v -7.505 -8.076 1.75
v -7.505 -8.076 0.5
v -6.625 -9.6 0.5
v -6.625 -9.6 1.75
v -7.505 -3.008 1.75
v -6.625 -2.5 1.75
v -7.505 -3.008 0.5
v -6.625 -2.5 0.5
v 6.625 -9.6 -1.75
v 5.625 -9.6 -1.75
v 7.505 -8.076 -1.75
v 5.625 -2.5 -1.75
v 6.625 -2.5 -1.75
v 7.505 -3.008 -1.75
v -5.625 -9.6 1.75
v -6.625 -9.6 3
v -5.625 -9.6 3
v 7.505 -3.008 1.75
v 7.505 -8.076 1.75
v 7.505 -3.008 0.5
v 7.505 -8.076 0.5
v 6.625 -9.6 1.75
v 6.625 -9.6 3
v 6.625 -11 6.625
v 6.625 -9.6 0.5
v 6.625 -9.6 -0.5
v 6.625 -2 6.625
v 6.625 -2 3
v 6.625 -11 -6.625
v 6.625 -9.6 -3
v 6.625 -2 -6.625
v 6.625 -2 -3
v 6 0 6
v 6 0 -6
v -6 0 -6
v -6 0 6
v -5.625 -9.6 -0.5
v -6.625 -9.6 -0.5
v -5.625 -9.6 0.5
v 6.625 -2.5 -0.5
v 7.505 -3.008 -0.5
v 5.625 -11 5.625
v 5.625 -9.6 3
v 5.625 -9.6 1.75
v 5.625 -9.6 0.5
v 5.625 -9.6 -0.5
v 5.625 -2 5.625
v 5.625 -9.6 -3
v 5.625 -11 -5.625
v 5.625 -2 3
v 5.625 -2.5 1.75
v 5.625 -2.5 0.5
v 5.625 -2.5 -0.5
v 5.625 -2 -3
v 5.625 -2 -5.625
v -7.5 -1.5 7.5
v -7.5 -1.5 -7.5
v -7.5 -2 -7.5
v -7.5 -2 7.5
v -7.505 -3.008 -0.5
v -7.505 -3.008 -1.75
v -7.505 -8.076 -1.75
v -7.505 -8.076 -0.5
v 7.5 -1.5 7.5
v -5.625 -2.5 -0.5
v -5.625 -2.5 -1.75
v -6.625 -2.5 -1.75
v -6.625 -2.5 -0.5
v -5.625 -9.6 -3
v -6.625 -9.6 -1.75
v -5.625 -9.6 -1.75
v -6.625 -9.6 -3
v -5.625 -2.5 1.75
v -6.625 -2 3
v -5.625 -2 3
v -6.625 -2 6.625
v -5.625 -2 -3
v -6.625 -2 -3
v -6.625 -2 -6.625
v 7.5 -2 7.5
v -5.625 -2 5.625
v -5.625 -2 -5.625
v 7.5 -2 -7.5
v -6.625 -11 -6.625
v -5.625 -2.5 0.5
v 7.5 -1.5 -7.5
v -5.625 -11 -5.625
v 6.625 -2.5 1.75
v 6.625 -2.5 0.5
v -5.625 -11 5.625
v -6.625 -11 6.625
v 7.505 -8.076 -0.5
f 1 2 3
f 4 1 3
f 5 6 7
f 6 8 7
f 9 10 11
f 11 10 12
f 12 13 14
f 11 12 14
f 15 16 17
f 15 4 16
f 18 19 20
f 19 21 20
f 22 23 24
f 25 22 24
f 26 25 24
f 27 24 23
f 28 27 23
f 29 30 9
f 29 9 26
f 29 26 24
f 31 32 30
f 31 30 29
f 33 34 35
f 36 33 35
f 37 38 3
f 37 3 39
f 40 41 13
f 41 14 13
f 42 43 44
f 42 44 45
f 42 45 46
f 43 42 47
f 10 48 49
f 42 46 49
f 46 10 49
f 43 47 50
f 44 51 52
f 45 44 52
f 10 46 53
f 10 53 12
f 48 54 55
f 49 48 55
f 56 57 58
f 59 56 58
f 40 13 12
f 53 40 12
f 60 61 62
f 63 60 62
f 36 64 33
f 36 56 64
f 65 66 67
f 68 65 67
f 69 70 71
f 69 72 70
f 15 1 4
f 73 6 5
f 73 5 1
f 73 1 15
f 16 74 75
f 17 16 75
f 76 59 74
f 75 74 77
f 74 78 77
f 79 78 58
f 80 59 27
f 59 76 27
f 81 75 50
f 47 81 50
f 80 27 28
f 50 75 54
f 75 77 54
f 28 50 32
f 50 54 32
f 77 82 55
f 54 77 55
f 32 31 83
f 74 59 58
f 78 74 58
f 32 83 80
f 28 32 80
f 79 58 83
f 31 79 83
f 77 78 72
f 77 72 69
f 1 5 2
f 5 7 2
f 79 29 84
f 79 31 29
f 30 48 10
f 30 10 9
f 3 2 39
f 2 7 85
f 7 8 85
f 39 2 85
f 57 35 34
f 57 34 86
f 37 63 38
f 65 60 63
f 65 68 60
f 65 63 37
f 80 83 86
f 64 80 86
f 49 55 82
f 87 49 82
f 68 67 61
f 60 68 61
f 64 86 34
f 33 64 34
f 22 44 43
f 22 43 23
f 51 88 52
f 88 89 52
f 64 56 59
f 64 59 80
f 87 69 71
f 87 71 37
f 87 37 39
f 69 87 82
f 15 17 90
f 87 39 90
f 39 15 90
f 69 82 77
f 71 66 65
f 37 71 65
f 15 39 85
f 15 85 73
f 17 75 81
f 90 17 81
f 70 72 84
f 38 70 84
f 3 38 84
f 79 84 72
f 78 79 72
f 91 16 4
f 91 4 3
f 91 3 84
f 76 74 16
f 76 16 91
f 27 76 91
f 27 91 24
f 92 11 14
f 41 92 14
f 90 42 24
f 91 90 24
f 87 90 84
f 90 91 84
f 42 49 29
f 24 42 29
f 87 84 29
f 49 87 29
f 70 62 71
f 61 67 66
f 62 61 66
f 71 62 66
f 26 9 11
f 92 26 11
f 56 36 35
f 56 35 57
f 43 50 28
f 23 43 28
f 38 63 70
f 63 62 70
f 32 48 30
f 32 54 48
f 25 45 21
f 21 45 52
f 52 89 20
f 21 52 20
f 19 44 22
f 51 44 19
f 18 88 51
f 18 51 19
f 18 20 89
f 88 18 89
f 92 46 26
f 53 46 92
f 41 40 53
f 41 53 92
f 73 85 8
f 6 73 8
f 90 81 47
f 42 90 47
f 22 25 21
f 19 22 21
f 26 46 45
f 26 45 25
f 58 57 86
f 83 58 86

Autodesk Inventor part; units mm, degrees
sketch "Sketch_1" plane through (0, 0, 0) normal (0, 0, 1) x (1, 0, 0)
  line L0 (-7.5, -1.5) -> (-7.5, -2)
  line L1 (-7.5, -2) -> (7.5, -2)
  line L2 (7.5, -2) -> (7.5, -1.5)
  line L3 (7.5, -1.5) -> (6, 0)
  line L4 (6, 0) -> (-6, 0)
  line L5 (-6, 0) -> (-7.5, -1.5)
extrude "Extrusion1" add sketch "Sketch_1" along normal mid plane 15
sketch "Sketch_2" plane through (0, 0, 0) normal (1, 0, 0) x (0, 0, -1)
  line L0 (-7.5, -1.5) -> (-6, 0)
  line L1 (-6, 0) -> (6, 0)
  line L2 (6, 0) -> (7.5, -1.5)
  line L3 (7.5, -1.5) -> (7.5, 3.5)
  line L4 (7.5, 3.5) -> (-7.5, 3.5)
  line L5 (-7.5, 3.5) -> (-7.5, -1.5)
extrude "Extrusion2" cut sketch "Sketch_2" along normal mid plane 15
sketch "Sketch_3" plane through (0, -2, 0) normal (0, 1, 0) x (1, 0, 0)
  line L0 (-6.625, -6.625) -> (6.625, -6.625)
  line L1 (6.625, -6.625) -> (6.625, 6.625)
  line L2 (6.625, 6.625) -> (-6.625, 6.625)
  line L3 (-6.625, 6.625) -> (-6.625, -6.625)
  line L4 (-5.625, -5.625) -> (5.625, -5.625)
  line L5 (5.625, -5.625) -> (5.625, 5.625)
  line L6 (5.625, 5.625) -> (-5.625, 5.625)
  line L7 (-5.625, 5.625) -> (-5.625, -5.625)
extrude "Extrusion3" add sketch "Sketch_3" against normal blind 9
sketch "Sketch_4" plane through (0, 0, 0) normal (0, 0, 1) x (1, 0, 0)
  line L0 (-7.5, -9.6) -> (7.5, -9.6)
  line L1 (7.5, -9.6) -> (7.5, -2)
  line L2 (7.5, -2) -> (-7.5, -2)
  line L3 (-7.5, -2) -> (-7.5, -9.6)
extrude "Extrusion4" cut sketch "Sketch_4" along normal mid plane 6
sketch "Sketch_6" plane through (0, 0, 1.125) normal (0, 0, 1) x (1, 0, 0)
  line L0 (5.625, -2.5) -> (5.625, -9.6)
  line L1 (5.625, -9.6) -> (6.625, -9.6)
  line L2 (6.625, -9.6) -> (7.505, -8.0758)
  line L3 (7.505, -8.0758) -> (7.505, -3.0081)
  line L4 (7.505, -3.0081) -> (6.625, -2.5)
  line L5 (6.625, -2.5) -> (5.625, -2.5)
extrude "Extrusion5" add sketch "Sketch_6" along normal mid plane 1.25
sketch "Sketch_7" plane through (0, 0, 1.125) normal (0, 0, 1) x (1, 0, 0)
  line L0 (-7.505, -3.0081) -> (-7.505, -8.0758)
  line L1 (-7.505, -8.0758) -> (-6.625, -9.6)
  line L2 (-6.625, -9.6) -> (-5.625, -9.6)
  line L3 (-5.625, -9.6) -> (-5.625, -2.5)
  line L4 (-5.625, -2.5) -> (-6.625, -2.5)
  line L5 (-6.625, -2.5) -> (-7.505, -3.0081)
extrude "Extrusion6" add sketch "Sketch_7" along normal mid plane 1.25
sketch "Sketch_8" plane through (0, 0, -1.125) normal (0, 0, 1) x (1, 0, 0)
  line L0 (5.625, -2.5) -> (5.625, -9.6)
  line L1 (5.625, -9.6) -> (6.625, -9.6)
  line L2 (6.625, -9.6) -> (7.505, -8.0758)
  line L3 (7.505, -8.0758) -> (7.505, -3.0081)
  line L4 (7.505, -3.0081) -> (6.625, -2.5)
  line L5 (6.625, -2.5) -> (5.625, -2.5)
extrude "Extrusion7" add sketch "Sketch_8" along normal mid plane 1.25
sketch "Sketch_9" plane through (0, 0, -1.125) normal (0, 0, 1) x (1, 0, 0)
  line L0 (-7.505, -3.0081) -> (-7.505, -8.0758)
  line L1 (-7.505, -8.0758) -> (-6.625, -9.6)
  line L2 (-6.625, -9.6) -> (-5.625, -9.6)
  line L3 (-5.625, -9.6) -> (-5.625, -2.5)
  line L4 (-5.625, -2.5) -> (-6.625, -2.5)
  line L5 (-6.625, -2.5) -> (-7.505, -3.0081)
extrude "Extrusion8" add sketch "Sketch_9" along normal mid plane 1.25
ref_plane "ABDECKSTOEPSEL_XY" through (0, 0, -7.5) normal (0, 0, -1) x (1, 0, 0)
ref_plane "ABDECKSTOEPSEL_YZ" through (0, 0, -7.5) normal (1, 0, 0) x (0, -1, 0)
ref_plane "ABDECKSTOEPSEL_ZX" through (0, 0, -7.5) normal (0, -1, 0) x (0, 0, -1)
properties part number "SLZ_63_Abdeck_Stoepsel#"
